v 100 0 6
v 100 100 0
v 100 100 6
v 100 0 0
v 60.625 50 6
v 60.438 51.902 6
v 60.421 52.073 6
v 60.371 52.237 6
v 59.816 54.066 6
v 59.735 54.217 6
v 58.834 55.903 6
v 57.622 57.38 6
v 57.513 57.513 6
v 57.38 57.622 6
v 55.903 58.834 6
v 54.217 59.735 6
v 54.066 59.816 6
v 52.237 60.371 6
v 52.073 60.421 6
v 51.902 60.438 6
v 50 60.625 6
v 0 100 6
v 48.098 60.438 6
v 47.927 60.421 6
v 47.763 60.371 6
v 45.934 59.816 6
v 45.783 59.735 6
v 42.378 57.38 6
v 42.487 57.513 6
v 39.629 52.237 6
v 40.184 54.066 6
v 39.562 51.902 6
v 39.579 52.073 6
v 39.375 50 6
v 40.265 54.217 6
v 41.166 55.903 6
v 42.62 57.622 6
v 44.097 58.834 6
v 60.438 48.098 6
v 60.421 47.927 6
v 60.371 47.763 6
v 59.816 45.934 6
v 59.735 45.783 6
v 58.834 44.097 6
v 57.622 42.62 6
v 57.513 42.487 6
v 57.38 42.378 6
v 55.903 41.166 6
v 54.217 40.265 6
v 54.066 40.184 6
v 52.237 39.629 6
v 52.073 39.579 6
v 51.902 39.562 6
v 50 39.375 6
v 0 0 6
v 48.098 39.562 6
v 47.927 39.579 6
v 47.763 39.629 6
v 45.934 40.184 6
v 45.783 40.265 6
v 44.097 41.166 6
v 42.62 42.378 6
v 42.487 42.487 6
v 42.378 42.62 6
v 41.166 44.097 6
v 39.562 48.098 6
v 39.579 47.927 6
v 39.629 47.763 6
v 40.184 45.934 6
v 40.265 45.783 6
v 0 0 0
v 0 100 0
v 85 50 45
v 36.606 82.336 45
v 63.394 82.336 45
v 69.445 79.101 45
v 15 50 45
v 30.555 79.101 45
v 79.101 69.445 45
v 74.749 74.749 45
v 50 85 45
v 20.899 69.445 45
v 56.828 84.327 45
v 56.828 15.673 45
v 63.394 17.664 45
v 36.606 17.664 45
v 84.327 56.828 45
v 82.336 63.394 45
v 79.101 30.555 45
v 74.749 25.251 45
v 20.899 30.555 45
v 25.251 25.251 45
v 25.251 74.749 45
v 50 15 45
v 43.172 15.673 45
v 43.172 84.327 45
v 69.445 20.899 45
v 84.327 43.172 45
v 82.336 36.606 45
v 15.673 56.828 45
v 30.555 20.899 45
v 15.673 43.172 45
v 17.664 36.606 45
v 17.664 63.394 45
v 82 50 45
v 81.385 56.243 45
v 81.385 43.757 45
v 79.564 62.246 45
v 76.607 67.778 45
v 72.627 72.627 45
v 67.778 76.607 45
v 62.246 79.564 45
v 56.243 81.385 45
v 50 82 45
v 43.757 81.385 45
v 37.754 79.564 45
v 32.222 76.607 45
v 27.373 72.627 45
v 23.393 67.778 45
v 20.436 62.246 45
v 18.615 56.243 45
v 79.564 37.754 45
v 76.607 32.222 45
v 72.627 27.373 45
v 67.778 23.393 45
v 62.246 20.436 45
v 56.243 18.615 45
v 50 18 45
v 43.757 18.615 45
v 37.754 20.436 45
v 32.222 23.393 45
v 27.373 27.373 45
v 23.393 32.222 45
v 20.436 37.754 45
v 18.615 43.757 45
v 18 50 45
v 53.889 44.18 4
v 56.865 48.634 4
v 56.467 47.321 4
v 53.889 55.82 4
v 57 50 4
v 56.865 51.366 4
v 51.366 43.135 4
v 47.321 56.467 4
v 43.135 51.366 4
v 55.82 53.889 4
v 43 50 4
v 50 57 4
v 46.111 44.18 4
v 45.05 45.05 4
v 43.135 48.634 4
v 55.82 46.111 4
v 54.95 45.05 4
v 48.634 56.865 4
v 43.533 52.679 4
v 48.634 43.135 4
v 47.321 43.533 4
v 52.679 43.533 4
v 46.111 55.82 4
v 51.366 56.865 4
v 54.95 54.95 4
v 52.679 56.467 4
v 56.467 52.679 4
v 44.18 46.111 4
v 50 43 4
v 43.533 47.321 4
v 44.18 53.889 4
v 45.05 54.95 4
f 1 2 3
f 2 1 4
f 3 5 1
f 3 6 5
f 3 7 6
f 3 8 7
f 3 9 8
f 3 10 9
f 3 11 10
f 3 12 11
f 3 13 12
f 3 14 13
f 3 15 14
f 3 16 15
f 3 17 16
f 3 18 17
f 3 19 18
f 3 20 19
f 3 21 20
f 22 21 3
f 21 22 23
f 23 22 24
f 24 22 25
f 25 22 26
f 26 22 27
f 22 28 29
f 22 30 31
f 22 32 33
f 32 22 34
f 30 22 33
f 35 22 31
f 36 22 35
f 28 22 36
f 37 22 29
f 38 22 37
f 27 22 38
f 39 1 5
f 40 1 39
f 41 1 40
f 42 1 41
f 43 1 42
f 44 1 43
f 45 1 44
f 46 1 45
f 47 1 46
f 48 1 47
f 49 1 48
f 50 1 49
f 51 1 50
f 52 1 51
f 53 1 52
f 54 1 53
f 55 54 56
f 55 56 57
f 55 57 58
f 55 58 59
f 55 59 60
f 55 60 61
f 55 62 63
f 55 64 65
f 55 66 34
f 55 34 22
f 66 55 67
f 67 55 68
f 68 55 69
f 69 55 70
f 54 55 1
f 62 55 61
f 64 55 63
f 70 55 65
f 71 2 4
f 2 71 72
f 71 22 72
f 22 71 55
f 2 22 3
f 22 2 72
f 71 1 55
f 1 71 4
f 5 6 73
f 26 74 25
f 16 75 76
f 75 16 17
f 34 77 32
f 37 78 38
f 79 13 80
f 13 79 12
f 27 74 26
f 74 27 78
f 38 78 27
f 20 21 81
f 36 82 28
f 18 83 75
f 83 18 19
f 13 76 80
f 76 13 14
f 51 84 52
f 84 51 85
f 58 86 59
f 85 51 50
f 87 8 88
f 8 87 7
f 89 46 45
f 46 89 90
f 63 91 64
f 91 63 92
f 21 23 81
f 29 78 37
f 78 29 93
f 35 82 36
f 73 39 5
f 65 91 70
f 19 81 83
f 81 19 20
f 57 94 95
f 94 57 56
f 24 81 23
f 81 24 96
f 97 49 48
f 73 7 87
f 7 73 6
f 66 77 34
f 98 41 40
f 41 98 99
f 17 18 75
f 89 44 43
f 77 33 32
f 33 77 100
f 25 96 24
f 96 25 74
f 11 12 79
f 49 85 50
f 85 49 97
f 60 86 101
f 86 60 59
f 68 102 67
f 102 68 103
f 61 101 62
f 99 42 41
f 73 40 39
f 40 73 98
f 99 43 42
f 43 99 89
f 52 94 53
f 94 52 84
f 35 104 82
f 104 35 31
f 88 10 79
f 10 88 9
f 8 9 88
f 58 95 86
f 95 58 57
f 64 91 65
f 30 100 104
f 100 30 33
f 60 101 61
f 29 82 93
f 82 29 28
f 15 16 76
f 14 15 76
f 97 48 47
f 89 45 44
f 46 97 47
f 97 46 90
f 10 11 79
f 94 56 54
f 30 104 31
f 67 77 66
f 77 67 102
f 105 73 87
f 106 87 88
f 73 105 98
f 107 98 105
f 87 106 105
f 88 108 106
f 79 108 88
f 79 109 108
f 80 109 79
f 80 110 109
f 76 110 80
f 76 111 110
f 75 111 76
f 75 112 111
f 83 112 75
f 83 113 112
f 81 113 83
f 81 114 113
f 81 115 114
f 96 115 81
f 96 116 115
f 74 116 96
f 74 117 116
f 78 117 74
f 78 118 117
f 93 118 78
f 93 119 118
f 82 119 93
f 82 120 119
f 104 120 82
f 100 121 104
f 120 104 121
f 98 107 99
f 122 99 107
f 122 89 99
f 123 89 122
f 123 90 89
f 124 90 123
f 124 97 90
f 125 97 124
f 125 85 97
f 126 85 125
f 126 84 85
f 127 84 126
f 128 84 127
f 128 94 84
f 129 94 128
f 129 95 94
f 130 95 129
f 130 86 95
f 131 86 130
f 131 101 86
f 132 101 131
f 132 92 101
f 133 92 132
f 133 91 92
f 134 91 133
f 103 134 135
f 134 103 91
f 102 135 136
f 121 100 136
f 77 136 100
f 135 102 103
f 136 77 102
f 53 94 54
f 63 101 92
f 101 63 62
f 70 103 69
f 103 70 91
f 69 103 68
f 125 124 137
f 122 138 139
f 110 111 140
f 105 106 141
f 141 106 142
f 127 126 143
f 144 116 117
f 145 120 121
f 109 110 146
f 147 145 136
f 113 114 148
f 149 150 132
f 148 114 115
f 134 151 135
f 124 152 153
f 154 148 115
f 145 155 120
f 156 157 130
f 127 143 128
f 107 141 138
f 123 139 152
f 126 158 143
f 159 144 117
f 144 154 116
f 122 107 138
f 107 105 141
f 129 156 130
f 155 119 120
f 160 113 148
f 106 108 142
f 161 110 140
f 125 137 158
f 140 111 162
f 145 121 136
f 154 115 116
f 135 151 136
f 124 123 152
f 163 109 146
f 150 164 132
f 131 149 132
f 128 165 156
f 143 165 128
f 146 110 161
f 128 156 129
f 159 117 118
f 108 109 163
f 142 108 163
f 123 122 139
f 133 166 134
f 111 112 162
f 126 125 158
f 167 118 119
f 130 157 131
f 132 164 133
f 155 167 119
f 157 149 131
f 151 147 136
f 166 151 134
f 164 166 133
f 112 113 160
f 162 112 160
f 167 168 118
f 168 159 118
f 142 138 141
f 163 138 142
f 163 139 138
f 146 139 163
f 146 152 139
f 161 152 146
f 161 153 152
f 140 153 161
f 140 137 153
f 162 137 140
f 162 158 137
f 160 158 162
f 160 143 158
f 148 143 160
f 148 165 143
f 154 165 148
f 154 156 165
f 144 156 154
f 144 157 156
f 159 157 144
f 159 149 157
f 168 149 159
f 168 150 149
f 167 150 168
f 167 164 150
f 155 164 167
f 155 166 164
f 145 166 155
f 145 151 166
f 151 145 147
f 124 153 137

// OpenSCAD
$fn = 32;

// ----------------------------------------------------------------------
// Hopper: funnel with square flange
// ----------------------------------------------------------------------

// --- parameters (mm) ---
fl = 100;                 // flange side, X and Y
fl_t = 6;                 // flange thickness
cone_h = 40;              // cone height above the flange
top_d = 70;               // cone mouth diameter
bot_d = 20;               // cone spout diameter
wall = 3;                 // cone wall thickness

bore_d = bot_d - 2 * wall;  // spout bore diameter
total_h = fl_t + cone_h - 1;  // overall height

difference() {
  union() {
    cube([fl, fl, fl_t]);
    translate([fl / 2, fl / 2, fl_t - 1])
      cylinder(h = cone_h, d1 = bot_d, d2 = top_d);
  }
  translate([fl / 2, fl / 2, fl_t - 2])
    cylinder(h = cone_h + 1, d1 = bore_d, d2 = top_d - 2 * wall);
}
